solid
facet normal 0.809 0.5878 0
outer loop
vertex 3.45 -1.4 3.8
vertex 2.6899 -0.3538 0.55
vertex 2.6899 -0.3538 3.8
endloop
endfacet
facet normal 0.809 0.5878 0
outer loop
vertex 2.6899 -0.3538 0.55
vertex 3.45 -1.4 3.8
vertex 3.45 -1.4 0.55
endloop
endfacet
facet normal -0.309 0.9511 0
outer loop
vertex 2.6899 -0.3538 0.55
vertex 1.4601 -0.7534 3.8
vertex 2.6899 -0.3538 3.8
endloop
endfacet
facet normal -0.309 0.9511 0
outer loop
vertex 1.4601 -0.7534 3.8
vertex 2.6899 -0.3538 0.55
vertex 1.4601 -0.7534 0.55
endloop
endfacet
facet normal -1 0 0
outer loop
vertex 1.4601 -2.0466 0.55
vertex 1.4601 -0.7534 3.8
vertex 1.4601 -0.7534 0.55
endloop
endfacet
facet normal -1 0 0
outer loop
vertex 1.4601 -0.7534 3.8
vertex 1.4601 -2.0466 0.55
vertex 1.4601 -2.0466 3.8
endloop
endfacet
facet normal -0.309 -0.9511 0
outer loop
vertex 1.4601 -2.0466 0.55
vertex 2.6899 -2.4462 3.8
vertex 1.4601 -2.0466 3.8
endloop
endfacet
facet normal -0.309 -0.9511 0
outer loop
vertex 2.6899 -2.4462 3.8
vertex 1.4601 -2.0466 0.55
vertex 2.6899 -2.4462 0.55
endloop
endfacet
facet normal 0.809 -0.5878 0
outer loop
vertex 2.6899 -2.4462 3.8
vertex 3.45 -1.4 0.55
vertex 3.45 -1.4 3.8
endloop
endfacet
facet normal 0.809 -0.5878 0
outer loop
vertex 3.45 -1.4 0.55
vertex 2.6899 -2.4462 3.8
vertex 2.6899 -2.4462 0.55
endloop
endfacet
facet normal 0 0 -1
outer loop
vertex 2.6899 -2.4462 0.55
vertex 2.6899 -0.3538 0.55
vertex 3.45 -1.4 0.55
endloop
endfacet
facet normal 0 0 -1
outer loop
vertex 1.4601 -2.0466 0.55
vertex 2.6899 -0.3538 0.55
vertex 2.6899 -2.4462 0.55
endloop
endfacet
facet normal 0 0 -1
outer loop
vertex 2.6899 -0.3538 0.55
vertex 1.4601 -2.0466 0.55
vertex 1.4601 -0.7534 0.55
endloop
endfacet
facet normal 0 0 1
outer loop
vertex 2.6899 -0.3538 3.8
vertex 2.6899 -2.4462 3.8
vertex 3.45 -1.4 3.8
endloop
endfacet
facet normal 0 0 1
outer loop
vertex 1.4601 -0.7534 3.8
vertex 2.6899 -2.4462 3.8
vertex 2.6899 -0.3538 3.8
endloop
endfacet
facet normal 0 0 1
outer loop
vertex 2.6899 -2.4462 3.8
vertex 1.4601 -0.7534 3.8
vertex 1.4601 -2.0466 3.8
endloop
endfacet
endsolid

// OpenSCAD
union() {
  translate([2.35, -1.4, 0.55]) cylinder(h=3.25, r=1.1, center=false);
}
